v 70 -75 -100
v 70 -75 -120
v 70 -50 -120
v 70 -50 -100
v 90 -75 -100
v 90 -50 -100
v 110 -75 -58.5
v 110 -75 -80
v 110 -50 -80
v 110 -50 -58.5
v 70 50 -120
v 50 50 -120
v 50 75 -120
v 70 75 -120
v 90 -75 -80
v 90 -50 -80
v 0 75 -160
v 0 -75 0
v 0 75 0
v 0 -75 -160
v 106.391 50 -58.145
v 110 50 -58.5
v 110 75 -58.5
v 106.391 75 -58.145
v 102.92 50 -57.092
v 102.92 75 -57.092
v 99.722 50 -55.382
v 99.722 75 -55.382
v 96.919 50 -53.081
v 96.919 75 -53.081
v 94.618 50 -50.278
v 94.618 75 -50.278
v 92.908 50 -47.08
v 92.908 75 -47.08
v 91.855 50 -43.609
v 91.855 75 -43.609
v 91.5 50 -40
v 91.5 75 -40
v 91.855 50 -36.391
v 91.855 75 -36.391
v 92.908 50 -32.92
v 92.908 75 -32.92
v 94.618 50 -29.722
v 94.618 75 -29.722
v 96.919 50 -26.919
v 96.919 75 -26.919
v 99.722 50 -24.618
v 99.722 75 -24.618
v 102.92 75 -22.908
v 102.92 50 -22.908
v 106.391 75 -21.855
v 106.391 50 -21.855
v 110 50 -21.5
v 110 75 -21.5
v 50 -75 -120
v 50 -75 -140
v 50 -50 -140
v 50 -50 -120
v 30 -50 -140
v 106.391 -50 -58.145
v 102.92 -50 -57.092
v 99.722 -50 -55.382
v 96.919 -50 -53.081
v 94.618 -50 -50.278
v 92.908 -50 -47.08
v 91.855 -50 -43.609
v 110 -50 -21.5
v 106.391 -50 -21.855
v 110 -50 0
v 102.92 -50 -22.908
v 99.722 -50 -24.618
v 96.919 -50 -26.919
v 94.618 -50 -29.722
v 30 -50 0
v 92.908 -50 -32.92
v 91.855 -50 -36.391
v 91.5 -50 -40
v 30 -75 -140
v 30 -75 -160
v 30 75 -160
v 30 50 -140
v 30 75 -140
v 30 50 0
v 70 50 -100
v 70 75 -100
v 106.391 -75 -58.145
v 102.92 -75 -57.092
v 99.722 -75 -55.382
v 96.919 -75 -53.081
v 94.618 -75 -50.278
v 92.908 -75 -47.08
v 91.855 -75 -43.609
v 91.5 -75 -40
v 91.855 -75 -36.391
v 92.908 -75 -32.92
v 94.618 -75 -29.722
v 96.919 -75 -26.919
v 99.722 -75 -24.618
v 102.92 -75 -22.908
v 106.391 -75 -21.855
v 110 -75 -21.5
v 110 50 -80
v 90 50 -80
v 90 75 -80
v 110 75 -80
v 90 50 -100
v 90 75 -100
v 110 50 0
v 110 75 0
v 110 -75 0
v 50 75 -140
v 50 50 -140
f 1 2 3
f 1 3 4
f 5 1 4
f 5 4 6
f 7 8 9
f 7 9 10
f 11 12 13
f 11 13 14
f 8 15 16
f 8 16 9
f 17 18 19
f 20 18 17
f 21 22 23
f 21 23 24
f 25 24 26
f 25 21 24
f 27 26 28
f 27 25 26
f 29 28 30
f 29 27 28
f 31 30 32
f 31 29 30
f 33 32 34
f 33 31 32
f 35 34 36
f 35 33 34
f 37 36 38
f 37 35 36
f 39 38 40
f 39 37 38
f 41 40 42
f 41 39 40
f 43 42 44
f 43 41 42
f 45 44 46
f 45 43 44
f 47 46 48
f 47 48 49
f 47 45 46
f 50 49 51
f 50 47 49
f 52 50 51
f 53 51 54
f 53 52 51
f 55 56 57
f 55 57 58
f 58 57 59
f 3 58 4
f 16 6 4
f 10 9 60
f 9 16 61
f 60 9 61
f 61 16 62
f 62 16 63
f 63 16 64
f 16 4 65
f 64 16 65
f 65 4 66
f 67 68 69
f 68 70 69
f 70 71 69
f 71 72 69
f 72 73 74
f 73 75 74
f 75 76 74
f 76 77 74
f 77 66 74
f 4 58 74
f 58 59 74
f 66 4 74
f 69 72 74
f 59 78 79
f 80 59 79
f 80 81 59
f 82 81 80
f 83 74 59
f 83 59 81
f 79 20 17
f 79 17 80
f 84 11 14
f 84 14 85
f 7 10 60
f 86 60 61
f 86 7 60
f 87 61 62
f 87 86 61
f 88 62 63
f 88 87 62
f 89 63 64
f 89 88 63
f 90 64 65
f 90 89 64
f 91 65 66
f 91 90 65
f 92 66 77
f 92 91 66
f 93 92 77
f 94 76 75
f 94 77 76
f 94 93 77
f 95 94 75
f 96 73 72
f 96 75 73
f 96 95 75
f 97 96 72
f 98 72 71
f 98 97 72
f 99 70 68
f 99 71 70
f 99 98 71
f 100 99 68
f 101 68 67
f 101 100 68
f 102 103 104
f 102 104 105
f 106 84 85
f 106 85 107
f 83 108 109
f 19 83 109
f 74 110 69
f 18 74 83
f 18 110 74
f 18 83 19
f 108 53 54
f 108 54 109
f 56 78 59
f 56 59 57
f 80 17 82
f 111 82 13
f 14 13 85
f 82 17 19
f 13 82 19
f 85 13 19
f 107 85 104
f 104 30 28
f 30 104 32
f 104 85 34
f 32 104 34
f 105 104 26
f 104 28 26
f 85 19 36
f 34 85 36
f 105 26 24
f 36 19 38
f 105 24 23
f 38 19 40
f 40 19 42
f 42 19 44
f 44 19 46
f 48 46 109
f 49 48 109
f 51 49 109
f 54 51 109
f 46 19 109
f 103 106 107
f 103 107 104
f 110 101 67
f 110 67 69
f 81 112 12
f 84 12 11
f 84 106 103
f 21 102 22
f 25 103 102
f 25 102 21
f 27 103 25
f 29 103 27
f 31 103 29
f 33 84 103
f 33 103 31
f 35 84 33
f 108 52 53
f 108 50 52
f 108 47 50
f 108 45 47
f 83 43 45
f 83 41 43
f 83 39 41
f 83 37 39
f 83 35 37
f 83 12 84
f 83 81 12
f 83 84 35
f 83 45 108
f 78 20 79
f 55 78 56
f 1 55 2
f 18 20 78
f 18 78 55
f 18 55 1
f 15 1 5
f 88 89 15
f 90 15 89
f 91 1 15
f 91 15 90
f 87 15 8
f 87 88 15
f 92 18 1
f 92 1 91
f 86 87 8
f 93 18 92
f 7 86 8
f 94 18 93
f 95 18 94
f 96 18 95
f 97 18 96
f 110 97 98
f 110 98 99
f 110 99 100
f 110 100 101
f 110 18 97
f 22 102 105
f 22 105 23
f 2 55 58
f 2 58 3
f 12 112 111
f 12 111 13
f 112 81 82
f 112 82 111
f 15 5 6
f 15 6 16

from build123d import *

# Parameters (mm, degrees)
F1_DEPTH      = 75
F1_DEPTH_BACK = 75
F3_START      = 30
F2_W          = 100
F2_H          = 200
F3_DEPTH      = 170


with BuildPart() as f1:
    # F0 (on Front) → F1 (new body, two sides)
    with BuildSketch(Plane.XZ) as f1_sk:
        with BuildLine():
            Line((110, 0), (0, 0))
            Line((0, 0), (0, -160))
            Line((0, -160), (30, -160))
            Line((30, -160), (30, -140))
            Line((30, -140), (50, -140))
            Line((50, -140), (50, -120))
            Line((50, -120), (70, -120))
            Line((70, -120), (70, -100))
            Line((70, -100), (90, -100))
            Line((90, -100), (90, -80))
            Line((90, -80), (110, -80))
            Line((110, -80), (110, -58.5))
            ThreePointArc((110, -58.5), (91.5, -40), (110, -21.5))
            Line((110, -21.5), (110, 0))
        make_face()
    extrude(amount=F1_DEPTH)
    extrude(f1_sk.sketch, amount=-F1_DEPTH_BACK)

    # F2 (on Right) → F3 (cut)
    with BuildSketch(Plane.YZ.offset(F3_START)):
        with Locations((0, -90)):
            Rectangle(F2_W, F2_H)
    extrude(amount=F3_DEPTH, mode=Mode.SUBTRACT)


solid = f1.part
